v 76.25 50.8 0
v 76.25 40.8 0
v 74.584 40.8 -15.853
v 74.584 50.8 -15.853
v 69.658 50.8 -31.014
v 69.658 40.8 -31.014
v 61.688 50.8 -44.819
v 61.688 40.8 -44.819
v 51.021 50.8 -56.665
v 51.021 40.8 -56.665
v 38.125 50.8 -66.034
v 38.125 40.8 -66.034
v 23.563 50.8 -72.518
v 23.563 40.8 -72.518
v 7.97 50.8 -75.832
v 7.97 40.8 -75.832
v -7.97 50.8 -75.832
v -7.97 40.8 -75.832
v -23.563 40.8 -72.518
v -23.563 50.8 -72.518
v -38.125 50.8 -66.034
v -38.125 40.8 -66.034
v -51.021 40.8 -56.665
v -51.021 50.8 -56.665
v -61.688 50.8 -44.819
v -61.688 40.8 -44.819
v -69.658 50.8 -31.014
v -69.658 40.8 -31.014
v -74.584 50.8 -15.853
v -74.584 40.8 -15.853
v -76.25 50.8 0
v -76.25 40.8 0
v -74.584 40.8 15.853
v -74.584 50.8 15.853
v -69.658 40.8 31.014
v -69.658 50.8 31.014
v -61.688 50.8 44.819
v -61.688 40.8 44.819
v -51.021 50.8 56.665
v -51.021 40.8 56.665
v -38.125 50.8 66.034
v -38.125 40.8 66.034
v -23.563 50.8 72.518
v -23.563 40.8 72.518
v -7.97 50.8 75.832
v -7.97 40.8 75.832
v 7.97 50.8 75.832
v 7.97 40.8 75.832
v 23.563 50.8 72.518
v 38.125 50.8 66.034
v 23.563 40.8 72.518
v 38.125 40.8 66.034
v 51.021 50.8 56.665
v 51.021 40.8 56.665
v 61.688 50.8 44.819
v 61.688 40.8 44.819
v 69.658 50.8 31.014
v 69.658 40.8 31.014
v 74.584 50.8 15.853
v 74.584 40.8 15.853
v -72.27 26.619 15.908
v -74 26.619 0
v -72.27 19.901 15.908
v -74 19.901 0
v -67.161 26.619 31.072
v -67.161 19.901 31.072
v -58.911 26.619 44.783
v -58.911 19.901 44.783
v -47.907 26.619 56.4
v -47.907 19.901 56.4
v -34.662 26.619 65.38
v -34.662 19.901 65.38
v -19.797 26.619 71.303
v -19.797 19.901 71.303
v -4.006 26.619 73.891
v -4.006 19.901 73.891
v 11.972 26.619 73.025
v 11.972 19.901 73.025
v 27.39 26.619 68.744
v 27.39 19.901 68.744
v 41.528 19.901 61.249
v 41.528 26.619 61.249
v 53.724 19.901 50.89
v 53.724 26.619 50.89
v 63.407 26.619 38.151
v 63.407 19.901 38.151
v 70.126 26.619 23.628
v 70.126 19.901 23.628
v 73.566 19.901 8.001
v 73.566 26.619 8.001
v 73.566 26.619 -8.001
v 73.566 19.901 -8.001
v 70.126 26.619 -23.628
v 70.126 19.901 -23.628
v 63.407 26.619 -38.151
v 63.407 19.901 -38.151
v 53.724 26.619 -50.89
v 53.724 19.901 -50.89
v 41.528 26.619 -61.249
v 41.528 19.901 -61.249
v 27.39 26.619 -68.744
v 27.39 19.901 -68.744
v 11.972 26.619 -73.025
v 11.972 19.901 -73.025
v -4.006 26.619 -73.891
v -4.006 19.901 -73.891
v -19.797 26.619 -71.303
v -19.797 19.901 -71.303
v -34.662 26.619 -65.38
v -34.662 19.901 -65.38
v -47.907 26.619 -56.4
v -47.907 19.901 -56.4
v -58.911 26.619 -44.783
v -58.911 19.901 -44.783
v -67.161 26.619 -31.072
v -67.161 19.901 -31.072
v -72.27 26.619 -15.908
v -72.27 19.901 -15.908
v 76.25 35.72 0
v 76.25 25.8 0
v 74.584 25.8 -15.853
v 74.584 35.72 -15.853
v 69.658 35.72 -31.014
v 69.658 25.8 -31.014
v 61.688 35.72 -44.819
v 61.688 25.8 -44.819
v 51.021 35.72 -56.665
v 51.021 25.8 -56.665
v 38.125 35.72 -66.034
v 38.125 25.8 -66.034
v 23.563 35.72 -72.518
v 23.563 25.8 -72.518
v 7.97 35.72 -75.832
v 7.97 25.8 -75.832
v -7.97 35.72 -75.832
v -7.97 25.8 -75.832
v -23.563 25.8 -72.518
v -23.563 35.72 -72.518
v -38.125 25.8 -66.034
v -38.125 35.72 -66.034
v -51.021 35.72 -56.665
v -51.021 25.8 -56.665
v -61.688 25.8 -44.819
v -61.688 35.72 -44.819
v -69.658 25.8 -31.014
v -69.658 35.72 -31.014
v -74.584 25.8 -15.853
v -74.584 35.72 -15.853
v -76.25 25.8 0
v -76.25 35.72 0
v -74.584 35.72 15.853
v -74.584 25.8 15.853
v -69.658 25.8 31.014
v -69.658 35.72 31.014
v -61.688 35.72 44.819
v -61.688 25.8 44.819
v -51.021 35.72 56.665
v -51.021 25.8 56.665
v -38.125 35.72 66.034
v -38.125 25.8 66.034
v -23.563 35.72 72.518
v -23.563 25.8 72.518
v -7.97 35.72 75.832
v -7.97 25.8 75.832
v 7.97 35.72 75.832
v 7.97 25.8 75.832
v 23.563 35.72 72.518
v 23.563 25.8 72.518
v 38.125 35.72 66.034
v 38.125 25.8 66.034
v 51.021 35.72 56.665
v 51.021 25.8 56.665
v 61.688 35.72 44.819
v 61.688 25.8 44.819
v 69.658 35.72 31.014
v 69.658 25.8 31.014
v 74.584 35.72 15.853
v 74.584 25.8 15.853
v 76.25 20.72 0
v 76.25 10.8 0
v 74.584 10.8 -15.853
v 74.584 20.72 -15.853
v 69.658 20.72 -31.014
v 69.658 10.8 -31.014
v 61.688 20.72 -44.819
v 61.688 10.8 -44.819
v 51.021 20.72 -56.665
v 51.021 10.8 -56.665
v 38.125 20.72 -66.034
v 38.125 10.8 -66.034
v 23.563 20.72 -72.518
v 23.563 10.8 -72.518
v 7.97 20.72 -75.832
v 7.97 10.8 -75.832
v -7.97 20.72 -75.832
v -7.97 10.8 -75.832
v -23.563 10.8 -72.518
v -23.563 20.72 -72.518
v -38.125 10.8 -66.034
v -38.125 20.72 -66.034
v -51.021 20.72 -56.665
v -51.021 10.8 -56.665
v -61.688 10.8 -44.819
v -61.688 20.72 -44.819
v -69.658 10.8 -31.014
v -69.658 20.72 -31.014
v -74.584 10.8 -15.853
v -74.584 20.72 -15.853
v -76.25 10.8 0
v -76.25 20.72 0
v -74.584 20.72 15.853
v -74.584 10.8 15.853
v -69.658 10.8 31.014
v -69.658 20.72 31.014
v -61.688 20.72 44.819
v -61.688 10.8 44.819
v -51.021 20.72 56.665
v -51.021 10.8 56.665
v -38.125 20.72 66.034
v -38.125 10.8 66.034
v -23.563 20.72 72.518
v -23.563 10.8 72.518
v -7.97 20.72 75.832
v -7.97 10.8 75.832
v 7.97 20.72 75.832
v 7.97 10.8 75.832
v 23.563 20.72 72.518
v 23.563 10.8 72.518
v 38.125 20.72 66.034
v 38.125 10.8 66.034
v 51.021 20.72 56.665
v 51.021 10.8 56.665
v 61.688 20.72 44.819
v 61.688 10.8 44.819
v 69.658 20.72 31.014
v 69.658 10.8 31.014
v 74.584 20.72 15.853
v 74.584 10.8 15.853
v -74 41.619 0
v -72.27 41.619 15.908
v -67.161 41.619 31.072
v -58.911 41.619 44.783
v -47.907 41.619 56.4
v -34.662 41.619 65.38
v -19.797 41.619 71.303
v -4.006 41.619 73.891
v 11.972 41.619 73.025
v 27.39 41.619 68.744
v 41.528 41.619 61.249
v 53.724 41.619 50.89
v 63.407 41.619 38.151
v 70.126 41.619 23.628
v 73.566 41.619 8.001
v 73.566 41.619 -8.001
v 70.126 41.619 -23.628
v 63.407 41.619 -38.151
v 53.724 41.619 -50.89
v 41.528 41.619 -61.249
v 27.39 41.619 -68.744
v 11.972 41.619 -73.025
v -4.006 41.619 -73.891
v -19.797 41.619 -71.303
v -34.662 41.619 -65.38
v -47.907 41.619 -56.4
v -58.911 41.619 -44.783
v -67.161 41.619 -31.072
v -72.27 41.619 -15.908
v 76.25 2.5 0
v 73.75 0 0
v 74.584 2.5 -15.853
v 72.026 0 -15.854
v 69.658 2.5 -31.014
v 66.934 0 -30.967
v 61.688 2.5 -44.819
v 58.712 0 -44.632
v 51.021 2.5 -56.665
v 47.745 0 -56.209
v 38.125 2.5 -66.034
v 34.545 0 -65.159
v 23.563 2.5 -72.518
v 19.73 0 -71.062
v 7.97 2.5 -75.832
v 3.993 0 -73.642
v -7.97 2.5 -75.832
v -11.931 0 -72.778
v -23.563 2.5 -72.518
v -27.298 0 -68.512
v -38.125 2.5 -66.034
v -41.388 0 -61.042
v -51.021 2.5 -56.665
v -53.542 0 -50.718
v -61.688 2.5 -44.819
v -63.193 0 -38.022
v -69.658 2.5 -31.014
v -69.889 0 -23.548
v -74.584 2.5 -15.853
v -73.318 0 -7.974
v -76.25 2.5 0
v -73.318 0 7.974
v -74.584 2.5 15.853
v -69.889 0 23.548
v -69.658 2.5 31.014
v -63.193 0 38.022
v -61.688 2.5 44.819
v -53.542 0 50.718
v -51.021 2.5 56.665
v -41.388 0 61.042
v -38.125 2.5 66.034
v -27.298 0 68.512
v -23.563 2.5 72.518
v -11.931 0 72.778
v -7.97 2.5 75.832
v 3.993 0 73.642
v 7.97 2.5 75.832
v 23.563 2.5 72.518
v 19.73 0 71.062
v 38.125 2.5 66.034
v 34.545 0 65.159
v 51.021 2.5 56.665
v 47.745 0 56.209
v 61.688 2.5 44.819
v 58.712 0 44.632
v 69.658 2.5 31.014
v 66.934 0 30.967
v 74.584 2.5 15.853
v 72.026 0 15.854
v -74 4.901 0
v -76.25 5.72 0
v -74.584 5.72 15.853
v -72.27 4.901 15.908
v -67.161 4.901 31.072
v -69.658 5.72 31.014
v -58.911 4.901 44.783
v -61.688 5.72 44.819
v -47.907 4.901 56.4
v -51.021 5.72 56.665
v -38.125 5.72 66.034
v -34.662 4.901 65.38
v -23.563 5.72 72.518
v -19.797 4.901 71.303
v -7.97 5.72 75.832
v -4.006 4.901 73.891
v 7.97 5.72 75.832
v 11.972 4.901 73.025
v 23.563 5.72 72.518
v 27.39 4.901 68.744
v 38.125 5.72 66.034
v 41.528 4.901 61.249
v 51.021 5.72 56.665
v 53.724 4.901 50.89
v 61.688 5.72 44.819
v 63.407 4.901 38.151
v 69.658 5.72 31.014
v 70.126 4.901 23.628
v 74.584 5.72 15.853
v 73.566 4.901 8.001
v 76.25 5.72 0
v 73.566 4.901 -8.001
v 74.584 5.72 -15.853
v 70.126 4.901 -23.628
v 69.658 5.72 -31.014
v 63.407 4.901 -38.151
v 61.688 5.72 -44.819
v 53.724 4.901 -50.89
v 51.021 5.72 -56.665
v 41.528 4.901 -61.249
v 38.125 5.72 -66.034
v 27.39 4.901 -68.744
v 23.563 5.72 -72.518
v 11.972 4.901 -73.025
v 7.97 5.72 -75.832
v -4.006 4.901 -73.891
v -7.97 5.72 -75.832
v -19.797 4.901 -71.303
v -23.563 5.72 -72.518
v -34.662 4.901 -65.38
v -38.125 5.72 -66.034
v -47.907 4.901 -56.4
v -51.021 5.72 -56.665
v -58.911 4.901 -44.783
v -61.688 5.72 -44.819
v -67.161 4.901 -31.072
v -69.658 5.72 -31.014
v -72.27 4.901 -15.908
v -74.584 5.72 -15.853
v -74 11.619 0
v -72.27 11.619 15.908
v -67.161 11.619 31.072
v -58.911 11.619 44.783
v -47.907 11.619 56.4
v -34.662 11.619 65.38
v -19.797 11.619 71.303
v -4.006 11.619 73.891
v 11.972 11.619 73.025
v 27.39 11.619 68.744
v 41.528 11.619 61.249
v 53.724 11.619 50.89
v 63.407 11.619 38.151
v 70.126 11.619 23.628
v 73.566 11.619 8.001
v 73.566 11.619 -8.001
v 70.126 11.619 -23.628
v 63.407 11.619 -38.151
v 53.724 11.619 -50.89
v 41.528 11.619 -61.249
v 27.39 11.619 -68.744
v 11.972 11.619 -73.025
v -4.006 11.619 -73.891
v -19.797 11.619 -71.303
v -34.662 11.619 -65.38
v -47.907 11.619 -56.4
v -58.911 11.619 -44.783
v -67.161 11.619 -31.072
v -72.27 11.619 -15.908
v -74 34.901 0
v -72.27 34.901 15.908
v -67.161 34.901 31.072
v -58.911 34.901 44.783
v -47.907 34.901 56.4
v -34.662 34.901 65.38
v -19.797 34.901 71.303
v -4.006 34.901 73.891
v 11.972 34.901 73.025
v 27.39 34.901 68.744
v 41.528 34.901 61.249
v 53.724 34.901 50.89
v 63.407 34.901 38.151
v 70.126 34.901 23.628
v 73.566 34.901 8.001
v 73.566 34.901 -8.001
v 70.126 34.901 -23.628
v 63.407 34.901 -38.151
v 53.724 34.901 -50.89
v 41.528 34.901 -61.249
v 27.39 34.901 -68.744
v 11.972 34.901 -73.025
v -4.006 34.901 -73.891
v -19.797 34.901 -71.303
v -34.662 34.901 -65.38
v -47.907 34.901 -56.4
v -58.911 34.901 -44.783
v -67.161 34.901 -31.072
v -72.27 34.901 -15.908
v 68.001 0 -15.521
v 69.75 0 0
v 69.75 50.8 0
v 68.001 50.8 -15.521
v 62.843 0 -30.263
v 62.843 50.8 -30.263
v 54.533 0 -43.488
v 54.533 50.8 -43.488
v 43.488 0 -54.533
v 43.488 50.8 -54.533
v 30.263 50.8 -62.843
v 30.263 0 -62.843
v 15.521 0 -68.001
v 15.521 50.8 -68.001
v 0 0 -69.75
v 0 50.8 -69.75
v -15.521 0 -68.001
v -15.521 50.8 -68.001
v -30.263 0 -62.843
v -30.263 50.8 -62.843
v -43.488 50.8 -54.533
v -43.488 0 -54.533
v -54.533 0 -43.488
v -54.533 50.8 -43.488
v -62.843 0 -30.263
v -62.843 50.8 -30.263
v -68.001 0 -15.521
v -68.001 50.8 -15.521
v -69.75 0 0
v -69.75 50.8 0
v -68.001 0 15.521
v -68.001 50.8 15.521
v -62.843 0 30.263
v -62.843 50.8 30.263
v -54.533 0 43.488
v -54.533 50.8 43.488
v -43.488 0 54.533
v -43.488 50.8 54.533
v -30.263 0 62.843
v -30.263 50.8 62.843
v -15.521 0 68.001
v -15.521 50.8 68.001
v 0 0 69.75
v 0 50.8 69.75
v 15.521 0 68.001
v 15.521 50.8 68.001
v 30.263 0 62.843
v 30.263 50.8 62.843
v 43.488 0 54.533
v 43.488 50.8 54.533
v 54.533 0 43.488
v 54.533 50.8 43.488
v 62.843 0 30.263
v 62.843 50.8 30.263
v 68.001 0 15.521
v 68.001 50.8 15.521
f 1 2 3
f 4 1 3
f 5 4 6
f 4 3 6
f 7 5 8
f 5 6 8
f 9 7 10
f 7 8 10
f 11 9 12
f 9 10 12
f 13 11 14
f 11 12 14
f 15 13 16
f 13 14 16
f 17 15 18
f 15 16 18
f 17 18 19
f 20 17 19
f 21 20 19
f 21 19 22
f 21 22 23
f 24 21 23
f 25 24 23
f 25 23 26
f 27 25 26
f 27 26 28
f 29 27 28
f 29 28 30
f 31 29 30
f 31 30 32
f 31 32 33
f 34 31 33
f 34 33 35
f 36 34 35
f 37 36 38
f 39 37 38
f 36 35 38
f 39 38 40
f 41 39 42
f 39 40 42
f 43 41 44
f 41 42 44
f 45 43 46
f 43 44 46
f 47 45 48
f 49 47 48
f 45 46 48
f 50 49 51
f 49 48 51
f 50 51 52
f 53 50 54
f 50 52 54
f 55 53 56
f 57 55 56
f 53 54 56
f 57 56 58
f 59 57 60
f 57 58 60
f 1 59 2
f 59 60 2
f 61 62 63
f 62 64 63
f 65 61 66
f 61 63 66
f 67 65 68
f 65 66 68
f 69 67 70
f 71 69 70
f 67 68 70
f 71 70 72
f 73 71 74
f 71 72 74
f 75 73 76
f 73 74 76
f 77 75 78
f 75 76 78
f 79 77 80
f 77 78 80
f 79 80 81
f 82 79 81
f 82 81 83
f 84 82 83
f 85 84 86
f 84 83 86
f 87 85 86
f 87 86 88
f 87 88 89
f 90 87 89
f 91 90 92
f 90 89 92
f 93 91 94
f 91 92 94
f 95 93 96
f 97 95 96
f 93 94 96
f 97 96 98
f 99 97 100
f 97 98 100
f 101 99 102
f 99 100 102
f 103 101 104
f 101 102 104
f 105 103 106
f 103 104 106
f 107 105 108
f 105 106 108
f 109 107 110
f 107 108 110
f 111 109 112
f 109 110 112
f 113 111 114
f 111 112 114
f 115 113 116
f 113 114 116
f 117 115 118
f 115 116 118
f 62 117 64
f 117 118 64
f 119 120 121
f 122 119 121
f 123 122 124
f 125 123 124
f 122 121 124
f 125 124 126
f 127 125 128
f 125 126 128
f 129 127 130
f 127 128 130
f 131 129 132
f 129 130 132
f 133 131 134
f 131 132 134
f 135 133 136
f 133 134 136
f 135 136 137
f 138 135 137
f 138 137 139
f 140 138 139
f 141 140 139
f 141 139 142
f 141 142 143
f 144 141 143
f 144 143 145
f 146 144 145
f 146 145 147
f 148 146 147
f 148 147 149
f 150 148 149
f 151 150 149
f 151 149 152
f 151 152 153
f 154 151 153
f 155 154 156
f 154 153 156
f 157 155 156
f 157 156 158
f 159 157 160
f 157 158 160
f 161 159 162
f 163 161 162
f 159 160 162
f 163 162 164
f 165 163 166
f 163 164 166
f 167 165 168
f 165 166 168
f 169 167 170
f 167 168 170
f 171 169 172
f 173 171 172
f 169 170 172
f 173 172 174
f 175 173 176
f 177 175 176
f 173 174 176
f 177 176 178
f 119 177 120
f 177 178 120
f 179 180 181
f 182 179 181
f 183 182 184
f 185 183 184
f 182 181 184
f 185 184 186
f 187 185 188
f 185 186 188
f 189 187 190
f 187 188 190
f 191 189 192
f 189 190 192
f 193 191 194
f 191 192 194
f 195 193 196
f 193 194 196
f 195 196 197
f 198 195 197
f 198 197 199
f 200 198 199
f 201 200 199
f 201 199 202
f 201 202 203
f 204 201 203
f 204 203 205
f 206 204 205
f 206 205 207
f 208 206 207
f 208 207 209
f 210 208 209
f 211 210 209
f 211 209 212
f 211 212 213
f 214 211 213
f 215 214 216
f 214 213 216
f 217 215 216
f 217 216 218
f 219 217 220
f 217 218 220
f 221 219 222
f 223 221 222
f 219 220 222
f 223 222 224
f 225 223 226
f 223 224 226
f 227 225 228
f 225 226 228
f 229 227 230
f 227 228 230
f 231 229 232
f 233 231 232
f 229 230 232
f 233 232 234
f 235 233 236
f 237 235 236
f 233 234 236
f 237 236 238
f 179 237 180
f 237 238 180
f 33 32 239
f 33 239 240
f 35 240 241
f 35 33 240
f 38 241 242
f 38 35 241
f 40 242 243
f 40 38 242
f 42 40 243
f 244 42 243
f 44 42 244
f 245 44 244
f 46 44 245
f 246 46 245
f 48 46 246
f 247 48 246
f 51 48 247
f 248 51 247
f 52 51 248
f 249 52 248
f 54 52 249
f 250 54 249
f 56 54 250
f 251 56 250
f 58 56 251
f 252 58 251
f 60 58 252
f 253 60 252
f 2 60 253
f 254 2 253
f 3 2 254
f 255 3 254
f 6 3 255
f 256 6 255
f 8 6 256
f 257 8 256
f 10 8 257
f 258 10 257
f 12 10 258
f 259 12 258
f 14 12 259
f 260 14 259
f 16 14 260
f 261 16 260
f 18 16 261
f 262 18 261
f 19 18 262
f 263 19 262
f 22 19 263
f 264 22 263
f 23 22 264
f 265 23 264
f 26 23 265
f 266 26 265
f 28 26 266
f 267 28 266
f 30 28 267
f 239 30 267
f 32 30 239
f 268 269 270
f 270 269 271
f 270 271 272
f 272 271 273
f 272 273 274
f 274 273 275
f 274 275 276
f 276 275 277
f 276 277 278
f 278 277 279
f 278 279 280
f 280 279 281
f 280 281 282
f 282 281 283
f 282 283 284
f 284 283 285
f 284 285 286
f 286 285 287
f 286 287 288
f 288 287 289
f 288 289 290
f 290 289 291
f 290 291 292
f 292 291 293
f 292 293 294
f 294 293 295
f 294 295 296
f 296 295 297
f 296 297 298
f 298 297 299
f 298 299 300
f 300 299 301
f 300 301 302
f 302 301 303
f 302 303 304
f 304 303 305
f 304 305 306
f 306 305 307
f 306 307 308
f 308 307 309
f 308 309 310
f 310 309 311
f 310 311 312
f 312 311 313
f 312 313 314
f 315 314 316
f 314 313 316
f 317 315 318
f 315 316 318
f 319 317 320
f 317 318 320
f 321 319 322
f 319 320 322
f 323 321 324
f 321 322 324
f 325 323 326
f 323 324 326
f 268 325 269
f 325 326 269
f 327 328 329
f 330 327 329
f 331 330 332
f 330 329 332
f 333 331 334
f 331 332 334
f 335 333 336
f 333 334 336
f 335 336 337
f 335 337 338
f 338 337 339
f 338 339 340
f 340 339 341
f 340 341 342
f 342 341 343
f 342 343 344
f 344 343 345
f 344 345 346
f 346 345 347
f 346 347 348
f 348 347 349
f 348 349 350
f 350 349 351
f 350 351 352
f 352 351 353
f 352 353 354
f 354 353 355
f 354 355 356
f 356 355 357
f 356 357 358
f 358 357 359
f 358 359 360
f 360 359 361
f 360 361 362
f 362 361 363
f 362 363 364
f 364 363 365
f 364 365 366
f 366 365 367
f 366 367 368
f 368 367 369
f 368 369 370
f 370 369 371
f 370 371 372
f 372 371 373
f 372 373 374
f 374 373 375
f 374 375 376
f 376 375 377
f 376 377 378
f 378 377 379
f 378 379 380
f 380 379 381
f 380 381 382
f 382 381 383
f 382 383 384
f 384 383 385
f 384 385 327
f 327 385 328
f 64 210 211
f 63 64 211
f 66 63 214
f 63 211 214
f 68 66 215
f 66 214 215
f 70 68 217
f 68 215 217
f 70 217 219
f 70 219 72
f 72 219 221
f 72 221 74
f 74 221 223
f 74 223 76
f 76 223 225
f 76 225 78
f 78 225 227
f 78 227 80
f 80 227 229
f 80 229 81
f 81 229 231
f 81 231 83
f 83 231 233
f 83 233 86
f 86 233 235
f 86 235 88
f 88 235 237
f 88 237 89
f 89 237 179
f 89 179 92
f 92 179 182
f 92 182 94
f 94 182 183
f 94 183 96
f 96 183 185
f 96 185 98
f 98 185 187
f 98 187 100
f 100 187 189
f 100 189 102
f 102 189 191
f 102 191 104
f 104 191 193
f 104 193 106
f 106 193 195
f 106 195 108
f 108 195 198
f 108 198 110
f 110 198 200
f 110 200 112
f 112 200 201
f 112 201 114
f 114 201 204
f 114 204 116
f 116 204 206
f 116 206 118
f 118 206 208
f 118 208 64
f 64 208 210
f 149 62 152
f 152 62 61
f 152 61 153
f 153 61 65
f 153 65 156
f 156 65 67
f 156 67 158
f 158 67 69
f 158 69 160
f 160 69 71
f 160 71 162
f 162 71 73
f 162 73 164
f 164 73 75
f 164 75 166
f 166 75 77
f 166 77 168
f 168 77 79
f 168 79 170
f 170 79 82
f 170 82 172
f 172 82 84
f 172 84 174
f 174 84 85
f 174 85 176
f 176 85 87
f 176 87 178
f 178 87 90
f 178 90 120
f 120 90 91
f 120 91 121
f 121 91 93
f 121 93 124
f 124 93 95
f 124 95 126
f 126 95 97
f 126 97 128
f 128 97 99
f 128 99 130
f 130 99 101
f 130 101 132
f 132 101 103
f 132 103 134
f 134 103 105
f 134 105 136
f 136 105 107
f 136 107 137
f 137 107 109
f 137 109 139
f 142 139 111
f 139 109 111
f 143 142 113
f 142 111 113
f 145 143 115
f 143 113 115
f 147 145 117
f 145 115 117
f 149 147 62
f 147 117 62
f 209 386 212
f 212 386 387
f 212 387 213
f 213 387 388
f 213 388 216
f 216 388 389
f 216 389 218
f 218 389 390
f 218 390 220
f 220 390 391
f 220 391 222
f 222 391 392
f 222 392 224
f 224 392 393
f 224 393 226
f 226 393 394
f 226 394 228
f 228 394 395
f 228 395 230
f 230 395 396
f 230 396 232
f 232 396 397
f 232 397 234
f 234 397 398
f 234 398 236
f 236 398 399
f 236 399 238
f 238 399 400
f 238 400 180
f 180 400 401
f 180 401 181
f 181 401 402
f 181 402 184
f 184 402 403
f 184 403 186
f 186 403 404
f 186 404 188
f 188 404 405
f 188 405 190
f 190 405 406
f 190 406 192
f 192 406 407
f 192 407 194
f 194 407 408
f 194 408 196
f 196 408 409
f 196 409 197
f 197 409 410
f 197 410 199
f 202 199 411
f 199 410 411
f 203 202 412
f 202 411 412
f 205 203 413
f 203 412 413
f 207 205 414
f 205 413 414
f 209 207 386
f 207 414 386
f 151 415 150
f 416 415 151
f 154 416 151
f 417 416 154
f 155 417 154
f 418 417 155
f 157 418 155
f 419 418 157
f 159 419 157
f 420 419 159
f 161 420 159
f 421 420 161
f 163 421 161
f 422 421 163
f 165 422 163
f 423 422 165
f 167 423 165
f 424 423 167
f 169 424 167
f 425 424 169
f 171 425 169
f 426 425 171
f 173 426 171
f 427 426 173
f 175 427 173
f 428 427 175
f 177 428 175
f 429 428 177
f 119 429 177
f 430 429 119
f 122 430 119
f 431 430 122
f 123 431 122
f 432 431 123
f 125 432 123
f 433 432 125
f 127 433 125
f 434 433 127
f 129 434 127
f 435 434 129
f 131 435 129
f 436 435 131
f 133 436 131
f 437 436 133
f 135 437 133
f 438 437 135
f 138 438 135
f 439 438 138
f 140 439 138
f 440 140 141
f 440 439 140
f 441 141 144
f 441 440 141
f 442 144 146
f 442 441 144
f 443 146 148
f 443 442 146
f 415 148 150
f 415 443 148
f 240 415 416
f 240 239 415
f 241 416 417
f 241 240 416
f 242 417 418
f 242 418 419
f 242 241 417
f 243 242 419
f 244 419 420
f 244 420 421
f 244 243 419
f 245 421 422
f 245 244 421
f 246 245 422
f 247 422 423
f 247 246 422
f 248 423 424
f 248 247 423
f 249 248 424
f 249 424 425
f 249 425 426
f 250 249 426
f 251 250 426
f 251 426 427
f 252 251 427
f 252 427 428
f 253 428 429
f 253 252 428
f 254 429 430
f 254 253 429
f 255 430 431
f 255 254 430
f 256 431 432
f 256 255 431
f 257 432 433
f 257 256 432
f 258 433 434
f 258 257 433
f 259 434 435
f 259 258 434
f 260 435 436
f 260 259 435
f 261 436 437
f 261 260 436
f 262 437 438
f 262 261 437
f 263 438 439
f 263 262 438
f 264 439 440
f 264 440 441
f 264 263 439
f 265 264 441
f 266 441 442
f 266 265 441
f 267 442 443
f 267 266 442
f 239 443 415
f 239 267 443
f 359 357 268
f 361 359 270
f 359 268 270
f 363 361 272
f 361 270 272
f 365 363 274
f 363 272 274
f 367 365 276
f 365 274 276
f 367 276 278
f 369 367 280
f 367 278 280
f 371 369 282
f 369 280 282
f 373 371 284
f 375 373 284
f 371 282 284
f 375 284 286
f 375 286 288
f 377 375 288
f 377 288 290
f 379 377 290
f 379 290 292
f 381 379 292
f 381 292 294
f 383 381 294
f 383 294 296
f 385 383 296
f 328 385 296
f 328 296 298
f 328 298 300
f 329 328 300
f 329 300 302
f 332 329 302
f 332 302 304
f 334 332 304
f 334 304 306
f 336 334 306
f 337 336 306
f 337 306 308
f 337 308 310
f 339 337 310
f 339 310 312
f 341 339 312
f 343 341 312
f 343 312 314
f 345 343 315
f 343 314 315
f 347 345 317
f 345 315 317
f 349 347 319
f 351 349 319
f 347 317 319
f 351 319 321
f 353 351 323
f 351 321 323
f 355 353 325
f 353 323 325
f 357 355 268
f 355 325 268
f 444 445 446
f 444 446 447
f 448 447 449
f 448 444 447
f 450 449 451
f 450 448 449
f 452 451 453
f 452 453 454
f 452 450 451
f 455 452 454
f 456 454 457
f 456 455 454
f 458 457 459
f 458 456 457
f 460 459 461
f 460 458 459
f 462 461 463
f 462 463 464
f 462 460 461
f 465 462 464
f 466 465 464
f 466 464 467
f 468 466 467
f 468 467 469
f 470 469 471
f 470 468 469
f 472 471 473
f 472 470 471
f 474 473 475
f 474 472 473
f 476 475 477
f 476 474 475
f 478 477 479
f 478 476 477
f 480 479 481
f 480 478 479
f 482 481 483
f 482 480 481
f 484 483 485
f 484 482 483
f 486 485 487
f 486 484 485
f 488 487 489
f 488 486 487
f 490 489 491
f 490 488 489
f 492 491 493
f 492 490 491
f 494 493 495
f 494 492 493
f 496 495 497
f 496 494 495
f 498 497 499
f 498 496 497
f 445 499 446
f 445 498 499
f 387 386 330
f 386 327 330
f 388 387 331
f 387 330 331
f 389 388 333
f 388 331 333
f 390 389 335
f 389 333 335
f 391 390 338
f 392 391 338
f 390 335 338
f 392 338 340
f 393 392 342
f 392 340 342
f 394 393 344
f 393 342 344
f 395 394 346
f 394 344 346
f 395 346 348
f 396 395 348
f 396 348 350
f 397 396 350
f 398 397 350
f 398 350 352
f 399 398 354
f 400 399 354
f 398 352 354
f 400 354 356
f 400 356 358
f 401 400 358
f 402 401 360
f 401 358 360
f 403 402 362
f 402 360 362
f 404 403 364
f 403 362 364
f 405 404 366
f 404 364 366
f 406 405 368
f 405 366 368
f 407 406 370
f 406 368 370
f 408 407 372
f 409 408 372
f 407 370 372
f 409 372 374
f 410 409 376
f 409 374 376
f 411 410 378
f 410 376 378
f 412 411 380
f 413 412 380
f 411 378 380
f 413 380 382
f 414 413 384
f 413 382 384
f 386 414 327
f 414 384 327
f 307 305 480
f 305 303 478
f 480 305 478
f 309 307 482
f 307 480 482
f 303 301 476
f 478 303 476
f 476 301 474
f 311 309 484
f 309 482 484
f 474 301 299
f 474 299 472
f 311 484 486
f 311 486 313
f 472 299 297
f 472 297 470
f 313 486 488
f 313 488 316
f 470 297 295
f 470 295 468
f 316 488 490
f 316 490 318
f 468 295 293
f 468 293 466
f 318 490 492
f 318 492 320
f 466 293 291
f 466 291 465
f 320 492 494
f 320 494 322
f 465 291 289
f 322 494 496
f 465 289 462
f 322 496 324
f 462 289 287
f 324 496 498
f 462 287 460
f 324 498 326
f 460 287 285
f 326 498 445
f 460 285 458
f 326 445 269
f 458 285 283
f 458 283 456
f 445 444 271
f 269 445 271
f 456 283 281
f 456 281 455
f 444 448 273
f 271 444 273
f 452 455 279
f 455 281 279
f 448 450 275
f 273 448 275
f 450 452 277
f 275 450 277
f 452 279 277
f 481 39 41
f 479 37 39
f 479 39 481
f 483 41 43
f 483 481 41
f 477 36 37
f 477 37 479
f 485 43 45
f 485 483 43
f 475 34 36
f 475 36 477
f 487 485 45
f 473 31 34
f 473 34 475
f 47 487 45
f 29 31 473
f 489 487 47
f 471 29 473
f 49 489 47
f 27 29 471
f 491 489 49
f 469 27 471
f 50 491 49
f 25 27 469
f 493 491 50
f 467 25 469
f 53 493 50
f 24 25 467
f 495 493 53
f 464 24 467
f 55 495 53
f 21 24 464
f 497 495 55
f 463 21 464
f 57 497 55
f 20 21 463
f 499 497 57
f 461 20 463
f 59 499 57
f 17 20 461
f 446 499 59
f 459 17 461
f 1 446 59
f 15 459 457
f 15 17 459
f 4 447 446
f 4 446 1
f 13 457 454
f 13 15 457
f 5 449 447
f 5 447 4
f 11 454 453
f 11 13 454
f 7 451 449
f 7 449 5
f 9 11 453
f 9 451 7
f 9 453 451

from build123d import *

# Parameters (mm, degrees)
SKETCH1_R           = 76.25
SKETCH1_R_2         = 69.75
BOSS_EXTRUDE1_DEPTH = 50.8
CHAMFER1_SIZE       = 2.5


with BuildPart() as part:
    # Sketch1 → Boss-Extrude1 (new body)
    with BuildSketch(Plane(origin=(0, 0, 0), x_dir=(1, 0, 0), z_dir=(0, 1, 0))):
        Circle(SKETCH1_R)
        Circle(SKETCH1_R_2, mode=Mode.SUBTRACT)
    extrude(amount=BOSS_EXTRUDE1_DEPTH)

    # Sketch2 → Cut-Revolve1 (revolve, cut)
    with BuildSketch(Plane.XY):
        Polygon((-76.25, 40.8), (-76.25, 35.72), (-74, 34.901066973), (-74, 41.618933027), align=None)
        Polygon((-74, 26.618933027), (-74, 19.901066973), (-76.25, 20.72), (-76.25, 25.8), align=None)
        Polygon((-74, 11.618933027), (-74, 4.901066973), (-76.25, 5.72), (-76.25, 10.8), align=None)
    revolve(axis=Axis((0, 0, 0), (0, 1, 0)), mode=Mode.SUBTRACT)

    # Chamfer1
    chamfer1_edges = [part.edges().sort_by_distance(p)[0] for p in [
        (-76.25, 0, 0),
    ]]
    chamfer(chamfer1_edges, length=CHAMFER1_SIZE)


solid = part.part
